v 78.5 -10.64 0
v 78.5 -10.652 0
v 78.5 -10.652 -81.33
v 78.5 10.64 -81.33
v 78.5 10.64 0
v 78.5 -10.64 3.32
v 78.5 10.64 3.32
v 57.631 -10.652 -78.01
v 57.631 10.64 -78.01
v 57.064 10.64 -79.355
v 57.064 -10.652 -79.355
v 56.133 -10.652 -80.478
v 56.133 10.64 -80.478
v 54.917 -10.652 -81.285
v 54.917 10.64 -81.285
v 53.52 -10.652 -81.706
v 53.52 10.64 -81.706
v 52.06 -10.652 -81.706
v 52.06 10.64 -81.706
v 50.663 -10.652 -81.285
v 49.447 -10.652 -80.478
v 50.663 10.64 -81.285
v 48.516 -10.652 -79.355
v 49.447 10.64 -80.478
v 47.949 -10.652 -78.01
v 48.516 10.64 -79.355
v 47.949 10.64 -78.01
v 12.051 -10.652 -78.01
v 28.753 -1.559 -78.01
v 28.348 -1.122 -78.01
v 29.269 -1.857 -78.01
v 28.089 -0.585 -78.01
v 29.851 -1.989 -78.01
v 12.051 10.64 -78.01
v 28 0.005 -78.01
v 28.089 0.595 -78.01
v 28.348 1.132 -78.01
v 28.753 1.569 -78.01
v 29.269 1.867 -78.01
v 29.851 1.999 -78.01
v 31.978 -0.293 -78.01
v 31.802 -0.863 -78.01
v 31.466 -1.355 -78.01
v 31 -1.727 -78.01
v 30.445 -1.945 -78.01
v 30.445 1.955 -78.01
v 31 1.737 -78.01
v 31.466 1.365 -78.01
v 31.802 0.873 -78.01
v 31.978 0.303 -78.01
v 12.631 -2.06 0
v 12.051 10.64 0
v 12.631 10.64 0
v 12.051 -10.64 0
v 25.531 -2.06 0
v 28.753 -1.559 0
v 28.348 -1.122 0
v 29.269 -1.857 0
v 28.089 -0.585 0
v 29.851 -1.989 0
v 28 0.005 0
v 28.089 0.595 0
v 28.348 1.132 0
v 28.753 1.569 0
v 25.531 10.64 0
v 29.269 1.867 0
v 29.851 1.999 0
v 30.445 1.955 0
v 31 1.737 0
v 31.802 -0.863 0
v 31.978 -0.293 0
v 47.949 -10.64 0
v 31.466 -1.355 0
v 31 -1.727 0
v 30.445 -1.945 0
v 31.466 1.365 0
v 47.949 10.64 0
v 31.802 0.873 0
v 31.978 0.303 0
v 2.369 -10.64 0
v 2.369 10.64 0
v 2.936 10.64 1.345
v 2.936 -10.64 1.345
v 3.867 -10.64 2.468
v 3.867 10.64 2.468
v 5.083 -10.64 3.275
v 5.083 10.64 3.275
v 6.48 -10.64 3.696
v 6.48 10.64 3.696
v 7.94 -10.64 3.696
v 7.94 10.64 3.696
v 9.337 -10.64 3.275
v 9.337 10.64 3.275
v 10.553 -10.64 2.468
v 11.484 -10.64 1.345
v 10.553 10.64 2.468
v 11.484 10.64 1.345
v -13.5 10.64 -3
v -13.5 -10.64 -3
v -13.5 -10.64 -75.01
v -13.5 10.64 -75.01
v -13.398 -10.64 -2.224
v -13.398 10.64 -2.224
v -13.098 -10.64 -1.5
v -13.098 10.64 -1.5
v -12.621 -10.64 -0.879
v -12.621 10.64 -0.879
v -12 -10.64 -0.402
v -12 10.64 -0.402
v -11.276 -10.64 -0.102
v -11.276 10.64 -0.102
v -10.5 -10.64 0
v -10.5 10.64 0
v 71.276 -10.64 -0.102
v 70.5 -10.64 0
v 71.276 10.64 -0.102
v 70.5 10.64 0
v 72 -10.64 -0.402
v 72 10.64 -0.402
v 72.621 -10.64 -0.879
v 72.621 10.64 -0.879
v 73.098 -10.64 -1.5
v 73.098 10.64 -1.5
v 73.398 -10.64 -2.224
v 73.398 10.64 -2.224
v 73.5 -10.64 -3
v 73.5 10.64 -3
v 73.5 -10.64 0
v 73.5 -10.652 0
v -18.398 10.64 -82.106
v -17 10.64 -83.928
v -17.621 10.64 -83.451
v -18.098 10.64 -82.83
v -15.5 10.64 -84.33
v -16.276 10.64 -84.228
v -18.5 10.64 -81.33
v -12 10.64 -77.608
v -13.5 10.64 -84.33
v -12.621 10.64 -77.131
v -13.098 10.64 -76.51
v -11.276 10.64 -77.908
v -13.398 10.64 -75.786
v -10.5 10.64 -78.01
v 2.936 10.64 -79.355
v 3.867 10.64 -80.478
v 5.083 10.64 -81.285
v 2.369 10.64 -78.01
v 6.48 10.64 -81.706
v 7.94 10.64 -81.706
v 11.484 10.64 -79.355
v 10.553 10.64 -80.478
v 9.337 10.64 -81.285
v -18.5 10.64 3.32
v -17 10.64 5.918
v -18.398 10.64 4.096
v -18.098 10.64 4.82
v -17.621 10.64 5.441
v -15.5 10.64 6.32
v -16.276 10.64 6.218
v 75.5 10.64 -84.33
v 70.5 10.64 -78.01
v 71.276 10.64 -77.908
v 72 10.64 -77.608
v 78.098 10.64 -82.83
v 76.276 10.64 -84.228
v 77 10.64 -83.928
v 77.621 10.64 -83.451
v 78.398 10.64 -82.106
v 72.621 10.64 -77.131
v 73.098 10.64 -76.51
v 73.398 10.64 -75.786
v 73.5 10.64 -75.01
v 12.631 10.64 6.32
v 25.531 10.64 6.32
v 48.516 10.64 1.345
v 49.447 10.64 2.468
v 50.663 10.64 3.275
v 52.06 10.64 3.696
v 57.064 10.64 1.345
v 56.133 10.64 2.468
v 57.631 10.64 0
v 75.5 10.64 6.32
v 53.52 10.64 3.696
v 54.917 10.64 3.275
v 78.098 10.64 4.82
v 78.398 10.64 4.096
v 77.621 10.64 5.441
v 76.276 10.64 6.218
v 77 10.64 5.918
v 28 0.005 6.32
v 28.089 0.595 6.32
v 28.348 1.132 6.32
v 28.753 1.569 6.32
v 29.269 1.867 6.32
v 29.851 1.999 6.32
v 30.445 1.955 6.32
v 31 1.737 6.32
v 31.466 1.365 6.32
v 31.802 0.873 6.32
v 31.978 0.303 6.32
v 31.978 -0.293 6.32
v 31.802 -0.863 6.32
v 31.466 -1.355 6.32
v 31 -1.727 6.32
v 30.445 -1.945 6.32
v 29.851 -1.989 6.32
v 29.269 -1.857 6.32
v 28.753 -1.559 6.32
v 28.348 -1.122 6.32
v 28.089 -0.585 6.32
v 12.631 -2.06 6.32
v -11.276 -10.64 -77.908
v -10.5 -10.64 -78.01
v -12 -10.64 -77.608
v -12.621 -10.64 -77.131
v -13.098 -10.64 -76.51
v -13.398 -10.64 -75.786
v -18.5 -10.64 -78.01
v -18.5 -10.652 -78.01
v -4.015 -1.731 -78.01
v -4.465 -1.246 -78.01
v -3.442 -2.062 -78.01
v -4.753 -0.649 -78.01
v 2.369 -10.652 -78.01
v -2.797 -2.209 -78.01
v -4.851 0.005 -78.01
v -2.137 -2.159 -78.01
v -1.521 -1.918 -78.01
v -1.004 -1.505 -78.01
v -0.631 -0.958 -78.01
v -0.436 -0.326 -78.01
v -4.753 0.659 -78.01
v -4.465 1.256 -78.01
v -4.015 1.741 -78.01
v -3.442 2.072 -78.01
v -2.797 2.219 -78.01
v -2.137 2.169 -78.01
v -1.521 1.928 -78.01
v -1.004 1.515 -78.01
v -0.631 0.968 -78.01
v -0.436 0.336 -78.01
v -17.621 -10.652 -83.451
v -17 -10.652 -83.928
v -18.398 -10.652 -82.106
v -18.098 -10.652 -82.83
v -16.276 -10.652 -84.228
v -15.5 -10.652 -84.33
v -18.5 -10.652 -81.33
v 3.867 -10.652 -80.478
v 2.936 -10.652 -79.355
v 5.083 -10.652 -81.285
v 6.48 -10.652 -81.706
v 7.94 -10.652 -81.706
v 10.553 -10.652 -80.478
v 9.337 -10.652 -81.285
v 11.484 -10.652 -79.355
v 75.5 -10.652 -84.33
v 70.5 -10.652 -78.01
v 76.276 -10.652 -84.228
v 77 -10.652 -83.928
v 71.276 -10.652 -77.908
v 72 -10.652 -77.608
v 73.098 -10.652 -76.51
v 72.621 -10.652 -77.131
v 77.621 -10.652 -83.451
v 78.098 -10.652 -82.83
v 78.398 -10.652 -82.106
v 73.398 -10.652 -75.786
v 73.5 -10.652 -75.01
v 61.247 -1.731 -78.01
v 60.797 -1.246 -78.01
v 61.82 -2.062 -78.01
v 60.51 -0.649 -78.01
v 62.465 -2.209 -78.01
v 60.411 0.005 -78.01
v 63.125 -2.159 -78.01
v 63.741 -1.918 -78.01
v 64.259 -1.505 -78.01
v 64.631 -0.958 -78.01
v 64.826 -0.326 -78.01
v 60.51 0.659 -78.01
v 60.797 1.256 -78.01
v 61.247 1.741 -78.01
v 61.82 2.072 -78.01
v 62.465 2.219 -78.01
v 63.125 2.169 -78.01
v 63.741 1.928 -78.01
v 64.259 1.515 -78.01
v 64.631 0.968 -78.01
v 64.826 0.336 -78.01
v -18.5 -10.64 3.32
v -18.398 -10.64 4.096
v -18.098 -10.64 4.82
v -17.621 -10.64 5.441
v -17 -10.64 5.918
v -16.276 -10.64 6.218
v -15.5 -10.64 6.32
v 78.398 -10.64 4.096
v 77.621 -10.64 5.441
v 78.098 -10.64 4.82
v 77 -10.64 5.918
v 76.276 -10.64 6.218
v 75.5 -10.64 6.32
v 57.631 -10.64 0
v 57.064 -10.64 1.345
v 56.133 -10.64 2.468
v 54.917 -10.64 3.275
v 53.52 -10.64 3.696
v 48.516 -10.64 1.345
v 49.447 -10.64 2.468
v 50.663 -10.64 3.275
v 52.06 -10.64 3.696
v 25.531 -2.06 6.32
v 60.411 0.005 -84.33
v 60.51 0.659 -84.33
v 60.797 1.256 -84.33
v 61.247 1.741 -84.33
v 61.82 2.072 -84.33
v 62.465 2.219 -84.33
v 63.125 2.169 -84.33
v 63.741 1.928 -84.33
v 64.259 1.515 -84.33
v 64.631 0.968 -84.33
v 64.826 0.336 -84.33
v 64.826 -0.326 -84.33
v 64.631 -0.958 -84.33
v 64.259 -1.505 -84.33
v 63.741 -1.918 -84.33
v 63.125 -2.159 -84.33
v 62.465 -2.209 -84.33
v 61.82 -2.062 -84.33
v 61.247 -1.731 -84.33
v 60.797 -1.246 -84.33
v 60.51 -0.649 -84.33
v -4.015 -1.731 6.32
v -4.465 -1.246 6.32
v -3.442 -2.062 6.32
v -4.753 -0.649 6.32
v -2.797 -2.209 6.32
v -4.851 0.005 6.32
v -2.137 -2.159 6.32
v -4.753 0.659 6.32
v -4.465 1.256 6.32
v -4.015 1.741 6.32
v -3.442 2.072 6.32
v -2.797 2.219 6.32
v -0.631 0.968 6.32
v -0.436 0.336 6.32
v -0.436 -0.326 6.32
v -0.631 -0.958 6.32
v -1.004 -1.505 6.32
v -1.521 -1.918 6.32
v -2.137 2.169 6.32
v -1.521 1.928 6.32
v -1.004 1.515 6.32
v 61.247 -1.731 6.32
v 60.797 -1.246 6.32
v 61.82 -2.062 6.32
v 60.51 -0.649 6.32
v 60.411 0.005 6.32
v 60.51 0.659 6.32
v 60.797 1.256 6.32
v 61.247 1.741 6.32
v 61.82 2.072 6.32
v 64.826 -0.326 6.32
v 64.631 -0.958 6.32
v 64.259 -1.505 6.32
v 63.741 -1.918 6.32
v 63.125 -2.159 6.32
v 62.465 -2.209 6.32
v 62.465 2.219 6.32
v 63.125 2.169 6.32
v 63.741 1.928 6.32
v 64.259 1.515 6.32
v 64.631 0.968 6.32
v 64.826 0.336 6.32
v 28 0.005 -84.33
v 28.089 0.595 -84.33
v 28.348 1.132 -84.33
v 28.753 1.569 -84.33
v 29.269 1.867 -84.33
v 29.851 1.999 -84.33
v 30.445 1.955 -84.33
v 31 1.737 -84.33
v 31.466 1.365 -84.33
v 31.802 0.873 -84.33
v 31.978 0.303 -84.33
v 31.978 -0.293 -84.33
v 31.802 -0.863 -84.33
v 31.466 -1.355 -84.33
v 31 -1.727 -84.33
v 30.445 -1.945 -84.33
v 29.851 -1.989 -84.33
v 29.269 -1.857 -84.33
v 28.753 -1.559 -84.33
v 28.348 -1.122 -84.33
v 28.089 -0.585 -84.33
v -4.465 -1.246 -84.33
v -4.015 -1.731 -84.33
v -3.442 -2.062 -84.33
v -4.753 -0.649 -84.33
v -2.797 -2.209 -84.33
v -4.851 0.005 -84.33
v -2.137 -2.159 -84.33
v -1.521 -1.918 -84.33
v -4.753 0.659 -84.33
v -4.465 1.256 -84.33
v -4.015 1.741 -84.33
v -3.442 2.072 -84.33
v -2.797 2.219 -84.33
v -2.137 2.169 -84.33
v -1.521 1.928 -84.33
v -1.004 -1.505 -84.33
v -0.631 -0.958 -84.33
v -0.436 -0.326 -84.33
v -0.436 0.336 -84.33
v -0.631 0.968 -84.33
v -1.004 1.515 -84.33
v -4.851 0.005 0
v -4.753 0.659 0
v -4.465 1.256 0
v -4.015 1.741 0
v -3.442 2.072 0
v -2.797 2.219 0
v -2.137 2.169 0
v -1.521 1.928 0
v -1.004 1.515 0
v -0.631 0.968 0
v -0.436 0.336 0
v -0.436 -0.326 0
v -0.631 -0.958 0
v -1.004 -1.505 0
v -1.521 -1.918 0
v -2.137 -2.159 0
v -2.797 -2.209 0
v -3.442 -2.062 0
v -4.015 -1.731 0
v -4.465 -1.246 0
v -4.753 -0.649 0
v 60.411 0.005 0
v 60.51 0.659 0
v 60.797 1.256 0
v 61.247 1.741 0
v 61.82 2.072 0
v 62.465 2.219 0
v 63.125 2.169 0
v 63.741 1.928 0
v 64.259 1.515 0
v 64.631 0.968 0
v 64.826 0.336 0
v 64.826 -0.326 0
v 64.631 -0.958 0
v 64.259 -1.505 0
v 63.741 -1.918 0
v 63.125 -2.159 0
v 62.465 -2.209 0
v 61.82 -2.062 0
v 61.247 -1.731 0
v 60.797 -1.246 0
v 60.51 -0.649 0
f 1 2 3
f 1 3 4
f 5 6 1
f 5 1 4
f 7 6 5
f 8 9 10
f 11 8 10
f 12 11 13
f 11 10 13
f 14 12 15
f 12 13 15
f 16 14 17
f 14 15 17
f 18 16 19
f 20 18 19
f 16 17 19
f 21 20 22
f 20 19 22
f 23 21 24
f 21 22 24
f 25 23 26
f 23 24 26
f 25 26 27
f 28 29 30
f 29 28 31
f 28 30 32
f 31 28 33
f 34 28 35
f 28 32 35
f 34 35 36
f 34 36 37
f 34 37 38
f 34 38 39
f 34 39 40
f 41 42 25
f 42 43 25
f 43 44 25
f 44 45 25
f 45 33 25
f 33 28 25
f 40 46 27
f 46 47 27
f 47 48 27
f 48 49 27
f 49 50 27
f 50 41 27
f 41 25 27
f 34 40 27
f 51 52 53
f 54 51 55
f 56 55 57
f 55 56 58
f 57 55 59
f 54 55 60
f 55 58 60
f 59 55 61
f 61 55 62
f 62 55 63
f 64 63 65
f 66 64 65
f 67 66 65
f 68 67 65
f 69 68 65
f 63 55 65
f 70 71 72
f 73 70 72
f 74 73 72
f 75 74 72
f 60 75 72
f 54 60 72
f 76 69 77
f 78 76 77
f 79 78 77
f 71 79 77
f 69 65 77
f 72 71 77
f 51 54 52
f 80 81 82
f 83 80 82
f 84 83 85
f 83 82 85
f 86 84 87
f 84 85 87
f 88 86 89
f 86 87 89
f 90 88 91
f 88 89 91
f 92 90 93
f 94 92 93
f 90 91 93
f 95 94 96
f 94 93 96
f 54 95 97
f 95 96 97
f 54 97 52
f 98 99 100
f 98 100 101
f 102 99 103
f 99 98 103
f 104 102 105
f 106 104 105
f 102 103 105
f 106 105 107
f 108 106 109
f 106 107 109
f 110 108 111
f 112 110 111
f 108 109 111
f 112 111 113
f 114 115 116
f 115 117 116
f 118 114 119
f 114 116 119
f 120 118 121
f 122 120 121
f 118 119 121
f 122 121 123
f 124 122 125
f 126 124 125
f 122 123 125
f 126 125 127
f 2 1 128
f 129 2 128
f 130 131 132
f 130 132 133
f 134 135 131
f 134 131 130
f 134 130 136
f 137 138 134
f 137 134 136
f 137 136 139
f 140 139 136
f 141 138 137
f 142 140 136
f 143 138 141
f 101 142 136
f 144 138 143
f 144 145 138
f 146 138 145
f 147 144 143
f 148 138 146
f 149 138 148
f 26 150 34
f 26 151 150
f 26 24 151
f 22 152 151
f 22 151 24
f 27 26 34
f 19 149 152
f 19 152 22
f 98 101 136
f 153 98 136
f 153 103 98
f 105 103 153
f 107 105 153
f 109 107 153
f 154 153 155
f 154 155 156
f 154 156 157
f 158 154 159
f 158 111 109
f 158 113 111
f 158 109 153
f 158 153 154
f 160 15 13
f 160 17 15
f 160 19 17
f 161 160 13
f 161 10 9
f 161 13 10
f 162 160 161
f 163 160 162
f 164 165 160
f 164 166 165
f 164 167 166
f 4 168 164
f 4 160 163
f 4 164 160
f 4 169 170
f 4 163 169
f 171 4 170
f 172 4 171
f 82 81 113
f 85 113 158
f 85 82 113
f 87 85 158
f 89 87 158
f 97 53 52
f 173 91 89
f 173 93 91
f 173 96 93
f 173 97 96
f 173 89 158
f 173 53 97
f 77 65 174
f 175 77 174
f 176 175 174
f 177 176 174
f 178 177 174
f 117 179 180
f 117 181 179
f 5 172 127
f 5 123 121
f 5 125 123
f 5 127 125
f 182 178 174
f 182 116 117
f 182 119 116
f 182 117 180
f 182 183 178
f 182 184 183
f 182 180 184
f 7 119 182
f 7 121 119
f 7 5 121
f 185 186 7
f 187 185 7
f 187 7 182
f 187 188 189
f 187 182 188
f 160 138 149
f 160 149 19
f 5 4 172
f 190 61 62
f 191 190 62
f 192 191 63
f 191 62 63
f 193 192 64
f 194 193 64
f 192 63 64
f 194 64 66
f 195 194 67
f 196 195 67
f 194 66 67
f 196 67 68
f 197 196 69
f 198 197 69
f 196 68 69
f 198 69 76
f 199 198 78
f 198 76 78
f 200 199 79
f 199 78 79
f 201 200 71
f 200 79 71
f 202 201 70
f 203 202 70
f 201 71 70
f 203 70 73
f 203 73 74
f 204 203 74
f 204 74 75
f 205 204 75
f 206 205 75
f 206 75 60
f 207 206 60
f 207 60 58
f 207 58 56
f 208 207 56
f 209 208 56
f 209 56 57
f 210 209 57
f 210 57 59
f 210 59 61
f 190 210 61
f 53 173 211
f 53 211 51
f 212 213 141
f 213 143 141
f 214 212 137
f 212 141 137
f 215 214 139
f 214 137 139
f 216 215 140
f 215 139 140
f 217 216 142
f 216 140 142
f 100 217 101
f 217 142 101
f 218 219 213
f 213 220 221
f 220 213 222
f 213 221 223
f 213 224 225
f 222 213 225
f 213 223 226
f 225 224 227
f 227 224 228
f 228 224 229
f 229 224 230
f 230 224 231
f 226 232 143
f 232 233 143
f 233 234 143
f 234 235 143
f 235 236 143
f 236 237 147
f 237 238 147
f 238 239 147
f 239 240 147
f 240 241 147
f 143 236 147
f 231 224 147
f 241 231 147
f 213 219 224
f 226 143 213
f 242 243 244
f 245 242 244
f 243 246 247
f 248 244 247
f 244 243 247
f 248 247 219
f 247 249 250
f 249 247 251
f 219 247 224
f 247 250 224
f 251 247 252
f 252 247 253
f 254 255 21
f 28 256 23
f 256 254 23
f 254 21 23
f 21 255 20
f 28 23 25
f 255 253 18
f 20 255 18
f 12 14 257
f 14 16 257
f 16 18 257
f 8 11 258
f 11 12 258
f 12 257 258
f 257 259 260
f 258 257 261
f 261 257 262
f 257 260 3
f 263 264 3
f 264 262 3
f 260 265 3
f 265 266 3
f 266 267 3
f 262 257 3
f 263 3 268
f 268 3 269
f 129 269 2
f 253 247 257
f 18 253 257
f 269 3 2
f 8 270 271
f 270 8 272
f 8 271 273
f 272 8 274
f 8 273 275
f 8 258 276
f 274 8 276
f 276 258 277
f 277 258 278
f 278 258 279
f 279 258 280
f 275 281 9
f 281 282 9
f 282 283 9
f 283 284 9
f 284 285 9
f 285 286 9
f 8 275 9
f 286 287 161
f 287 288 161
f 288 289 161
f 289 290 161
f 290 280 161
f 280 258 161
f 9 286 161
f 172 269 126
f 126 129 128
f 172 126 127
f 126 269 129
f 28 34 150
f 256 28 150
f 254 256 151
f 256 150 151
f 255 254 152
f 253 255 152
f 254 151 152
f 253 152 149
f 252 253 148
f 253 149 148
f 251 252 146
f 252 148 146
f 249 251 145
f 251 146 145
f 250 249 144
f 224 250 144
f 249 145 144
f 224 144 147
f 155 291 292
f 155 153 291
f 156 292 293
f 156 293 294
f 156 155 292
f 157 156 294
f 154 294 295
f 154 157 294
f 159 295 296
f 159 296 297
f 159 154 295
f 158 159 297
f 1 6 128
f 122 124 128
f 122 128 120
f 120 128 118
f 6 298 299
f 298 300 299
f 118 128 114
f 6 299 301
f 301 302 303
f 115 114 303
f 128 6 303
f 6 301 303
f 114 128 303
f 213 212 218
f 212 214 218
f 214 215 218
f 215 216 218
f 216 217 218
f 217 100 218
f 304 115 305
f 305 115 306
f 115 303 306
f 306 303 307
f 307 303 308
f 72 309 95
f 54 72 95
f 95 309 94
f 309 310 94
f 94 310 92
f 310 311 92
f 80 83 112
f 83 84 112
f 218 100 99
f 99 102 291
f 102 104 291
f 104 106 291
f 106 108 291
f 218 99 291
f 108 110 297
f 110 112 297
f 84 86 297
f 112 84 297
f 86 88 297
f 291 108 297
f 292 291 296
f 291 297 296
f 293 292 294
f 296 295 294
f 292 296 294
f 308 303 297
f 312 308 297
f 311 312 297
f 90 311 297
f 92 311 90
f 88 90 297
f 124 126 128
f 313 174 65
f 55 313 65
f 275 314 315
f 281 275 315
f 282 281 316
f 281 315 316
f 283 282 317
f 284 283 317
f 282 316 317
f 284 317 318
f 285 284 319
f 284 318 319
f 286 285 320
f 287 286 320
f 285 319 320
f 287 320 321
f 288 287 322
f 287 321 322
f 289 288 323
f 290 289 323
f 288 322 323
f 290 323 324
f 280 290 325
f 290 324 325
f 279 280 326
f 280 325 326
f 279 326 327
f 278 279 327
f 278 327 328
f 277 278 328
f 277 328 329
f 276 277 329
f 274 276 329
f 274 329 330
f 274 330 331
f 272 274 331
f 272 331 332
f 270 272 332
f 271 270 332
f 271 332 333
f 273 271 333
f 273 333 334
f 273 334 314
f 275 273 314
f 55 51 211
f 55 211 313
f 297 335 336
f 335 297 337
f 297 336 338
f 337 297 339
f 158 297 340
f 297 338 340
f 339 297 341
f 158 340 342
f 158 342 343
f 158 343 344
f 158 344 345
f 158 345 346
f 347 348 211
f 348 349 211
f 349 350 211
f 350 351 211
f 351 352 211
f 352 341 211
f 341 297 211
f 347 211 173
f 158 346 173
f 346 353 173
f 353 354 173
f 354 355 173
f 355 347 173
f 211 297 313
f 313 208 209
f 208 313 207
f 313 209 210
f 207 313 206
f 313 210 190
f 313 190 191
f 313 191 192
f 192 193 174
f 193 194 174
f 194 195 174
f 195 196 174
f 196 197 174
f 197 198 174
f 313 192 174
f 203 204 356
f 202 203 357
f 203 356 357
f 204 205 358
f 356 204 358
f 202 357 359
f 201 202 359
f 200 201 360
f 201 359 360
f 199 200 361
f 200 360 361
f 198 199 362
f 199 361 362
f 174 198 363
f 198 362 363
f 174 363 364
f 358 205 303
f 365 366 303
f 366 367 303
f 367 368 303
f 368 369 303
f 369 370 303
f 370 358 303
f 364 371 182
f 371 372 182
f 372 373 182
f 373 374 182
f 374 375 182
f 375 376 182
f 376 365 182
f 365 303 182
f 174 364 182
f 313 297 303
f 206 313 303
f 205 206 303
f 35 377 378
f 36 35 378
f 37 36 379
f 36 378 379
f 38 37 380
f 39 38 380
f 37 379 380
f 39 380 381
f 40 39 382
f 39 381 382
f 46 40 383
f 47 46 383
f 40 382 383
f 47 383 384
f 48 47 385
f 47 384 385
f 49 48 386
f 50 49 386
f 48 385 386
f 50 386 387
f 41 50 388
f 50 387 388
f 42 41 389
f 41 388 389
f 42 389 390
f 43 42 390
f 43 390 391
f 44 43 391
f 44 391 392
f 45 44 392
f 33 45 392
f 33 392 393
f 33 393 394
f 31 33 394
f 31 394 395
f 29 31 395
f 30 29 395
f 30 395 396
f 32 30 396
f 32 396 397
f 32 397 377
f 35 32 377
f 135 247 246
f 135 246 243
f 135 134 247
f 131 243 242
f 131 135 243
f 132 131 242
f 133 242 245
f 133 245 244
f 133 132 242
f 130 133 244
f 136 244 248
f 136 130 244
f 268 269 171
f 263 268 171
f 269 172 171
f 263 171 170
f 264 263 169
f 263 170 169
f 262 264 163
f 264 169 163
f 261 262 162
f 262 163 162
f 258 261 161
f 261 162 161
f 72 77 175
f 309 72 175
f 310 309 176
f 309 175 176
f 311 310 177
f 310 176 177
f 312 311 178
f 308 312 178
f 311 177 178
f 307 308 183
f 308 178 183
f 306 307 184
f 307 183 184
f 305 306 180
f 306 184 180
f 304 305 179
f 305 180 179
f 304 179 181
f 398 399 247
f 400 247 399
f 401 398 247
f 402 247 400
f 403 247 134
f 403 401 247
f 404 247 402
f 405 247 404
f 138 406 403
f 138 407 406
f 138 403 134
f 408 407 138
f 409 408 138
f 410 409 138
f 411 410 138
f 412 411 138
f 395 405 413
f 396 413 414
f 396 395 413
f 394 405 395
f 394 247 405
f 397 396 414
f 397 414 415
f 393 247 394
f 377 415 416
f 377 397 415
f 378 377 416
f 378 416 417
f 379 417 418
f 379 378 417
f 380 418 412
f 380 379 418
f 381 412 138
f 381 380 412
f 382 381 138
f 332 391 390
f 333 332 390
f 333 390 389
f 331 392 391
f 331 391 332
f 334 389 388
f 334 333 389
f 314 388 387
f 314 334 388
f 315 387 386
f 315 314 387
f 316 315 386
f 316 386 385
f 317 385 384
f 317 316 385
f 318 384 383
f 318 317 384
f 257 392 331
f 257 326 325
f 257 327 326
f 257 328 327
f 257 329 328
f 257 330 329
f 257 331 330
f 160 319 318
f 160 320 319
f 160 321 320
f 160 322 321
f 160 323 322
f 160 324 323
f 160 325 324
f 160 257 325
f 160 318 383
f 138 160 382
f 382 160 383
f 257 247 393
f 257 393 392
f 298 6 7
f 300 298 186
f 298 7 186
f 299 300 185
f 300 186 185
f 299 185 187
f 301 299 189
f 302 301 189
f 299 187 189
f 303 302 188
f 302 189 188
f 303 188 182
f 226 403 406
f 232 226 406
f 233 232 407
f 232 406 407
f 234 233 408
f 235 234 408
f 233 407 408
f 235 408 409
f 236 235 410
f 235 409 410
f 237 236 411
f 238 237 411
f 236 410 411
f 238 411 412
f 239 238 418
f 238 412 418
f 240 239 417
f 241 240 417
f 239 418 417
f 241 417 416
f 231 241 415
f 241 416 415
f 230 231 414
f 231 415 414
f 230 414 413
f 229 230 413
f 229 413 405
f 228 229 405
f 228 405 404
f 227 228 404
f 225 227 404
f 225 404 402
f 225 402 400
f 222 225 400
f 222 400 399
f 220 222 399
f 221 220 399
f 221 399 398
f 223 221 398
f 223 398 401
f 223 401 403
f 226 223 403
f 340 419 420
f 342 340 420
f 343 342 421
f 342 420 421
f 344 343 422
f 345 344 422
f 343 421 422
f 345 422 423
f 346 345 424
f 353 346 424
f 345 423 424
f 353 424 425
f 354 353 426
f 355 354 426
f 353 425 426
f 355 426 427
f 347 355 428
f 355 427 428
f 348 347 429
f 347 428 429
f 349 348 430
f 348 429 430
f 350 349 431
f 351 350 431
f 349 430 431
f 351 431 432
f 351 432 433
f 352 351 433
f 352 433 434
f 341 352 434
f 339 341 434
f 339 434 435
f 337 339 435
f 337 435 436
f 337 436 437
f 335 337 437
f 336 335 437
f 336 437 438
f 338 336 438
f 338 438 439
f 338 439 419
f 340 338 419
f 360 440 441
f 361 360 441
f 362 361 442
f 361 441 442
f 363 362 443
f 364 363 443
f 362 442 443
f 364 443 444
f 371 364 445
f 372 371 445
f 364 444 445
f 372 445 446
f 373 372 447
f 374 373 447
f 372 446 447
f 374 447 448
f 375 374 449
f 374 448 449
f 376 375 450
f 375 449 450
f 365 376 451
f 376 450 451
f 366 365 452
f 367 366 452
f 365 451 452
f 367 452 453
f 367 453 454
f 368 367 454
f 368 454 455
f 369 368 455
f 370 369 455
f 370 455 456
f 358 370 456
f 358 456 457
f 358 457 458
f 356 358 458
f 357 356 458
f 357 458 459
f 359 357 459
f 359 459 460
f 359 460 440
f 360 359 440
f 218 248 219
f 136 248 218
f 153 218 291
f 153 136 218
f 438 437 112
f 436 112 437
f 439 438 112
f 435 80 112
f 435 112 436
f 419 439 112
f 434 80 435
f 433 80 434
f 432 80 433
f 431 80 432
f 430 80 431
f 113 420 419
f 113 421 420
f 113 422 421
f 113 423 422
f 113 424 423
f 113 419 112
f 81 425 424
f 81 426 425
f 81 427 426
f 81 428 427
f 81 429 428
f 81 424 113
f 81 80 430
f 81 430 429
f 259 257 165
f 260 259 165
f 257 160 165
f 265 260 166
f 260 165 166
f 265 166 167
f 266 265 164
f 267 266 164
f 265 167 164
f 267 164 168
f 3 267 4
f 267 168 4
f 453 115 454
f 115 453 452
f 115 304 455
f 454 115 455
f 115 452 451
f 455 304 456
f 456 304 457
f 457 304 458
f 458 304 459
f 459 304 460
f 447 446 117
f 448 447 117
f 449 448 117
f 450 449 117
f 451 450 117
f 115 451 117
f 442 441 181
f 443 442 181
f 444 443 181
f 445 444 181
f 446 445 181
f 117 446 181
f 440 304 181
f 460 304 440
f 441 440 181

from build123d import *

# Parameters (mm, degrees)
SKETCH1_W           = 60
SKETCH1_H           = 6.32
BOSS_EXTRUDE1_DEPTH = 10.64
SKETCH2_R           = 5
CUT_EXTRUDE1_DEPTH  = 64.974845056
SKETCH3_W           = 6.32
SKETCH3_H           = 21.28
BOSS_EXTRUDE2_DEPTH = 18.5
SKETCH4_W           = 6.32
SKETCH4_H           = 21.28
BOSS_EXTRUDE3_DEPTH = 18.5
SKETCH5_W           = 5
SKETCH5_H           = 21.28
BOSS_EXTRUDE6_DEPTH = 84.33
SKETCH6_W           = 5
SKETCH6_H           = 21.291954735
BOSS_EXTRUDE7_DEPTH = 84.33
SKETCH7_W           = 6.32
SKETCH7_H           = 21.291954735
BOSS_EXTRUDE8_DEPTH = 92
SKETCH9_R           = 5
CUT_EXTRUDE2_DEPTH  = 118.162904694
SKETCH10_R          = 2.22
CUT_EXTRUDE3_DEPTH  = 121.387443862
FILLET1_R           = 3
SKETCH13_R          = 2
CUT_EXTRUDE4_DEPTH  = 121.387443862
SKETCH14_W          = 12.9
SKETCH14_H          = 6.32
CUT_EXTRUDE5_DEPTH  = 12.7


with BuildPart() as part:
    # Sketch1 → Boss-Extrude1 (new, symmetric)
    with BuildSketch(Plane(origin=(0, 0, 0), x_dir=(1, 0, 0), z_dir=(0, 1, 0))):
        with Locations((30, -3.16)):
            Rectangle(SKETCH1_W, SKETCH1_H)
    extrude(amount=BOSS_EXTRUDE1_DEPTH, both=True)

    # Sketch2 → Cut-Extrude1 (cut, through all)
    with BuildSketch(Plane(origin=(0, 10.64, 0), x_dir=(1, 0, 0), z_dir=(0, 1, 0))):
        with Locations((7.21, 1.25)):
            Circle(SKETCH2_R)
        with Locations((52.79, 1.25)):
            Circle(SKETCH2_R)
    extrude(amount=-CUT_EXTRUDE1_DEPTH, mode=Mode.SUBTRACT)

    # Sketch3 → Boss-Extrude2 (add)
    with BuildSketch(Plane(origin=(60, 0, 0), x_dir=(0, 0, -1), z_dir=(1, 0, 0))):
        with Locations((-3.16, 0)):
            Rectangle(SKETCH3_W, SKETCH3_H)
    extrude(amount=BOSS_EXTRUDE2_DEPTH)

    # Sketch4 → Boss-Extrude3 (add)
    with BuildSketch(Plane.ZY):
        with Locations((3.16, 0)):
            Rectangle(SKETCH4_W, SKETCH4_H)
    extrude(amount=BOSS_EXTRUDE3_DEPTH)

    # Sketch5 → Boss-Extrude6 (add)
    with BuildSketch(Plane(origin=(0, 0, 0), x_dir=(-1, 0, 0), z_dir=(0, 0, -1))):
        with Locations((16, 0)):
            Rectangle(SKETCH5_W, SKETCH5_H)
    extrude(amount=BOSS_EXTRUDE6_DEPTH)

    # Sketch6 → Boss-Extrude7 (add)
    with BuildSketch(Plane(origin=(0, 0, 0), x_dir=(-1, 0, 0), z_dir=(0, 0, -1))):
        with Locations((-76, -0.005977367)):
            Rectangle(SKETCH6_W, SKETCH6_H)
    extrude(amount=BOSS_EXTRUDE7_DEPTH)

    # Sketch7 → Boss-Extrude8 (add, through all)
    with BuildSketch(Plane.ZY.offset(-73.5)):
        with Locations((-81.17, -0.005977367)):
            Rectangle(SKETCH7_W, SKETCH7_H)
    extrude(amount=BOSS_EXTRUDE8_DEPTH)

    # Sketch9 → Cut-Extrude2 (cut, through all)
    with BuildSketch(Plane(origin=(0, 10.64, 0), x_dir=(1, 0, 0), z_dir=(0, 1, 0))):
        with Locations((7.21, 76.76)):
            Circle(SKETCH9_R)
        with Locations((52.79, 76.76)):
            Circle(SKETCH9_R)
    extrude(amount=-CUT_EXTRUDE2_DEPTH, mode=Mode.SUBTRACT)

    # Sketch10 → Cut-Extrude3 (cut, through all)
    with BuildSketch(Plane(origin=(0, 0, -84.33), x_dir=(-1, 0, 0), z_dir=(0, 0, -1))):
        with Locations((-62.631229183, 0.005)):
            Circle(SKETCH10_R)
        with Locations((2.631229183, 0.005)):
            Circle(SKETCH10_R)
    extrude(amount=-CUT_EXTRUDE3_DEPTH, mode=Mode.SUBTRACT)

    # Fillet1
    fillet1_edges = [part.edges().sort_by_distance(p)[0] for p in [
        (78.5, 0, 6.32),
        (-18.5, 0, 6.32),
        (-13.5, 0, 0),
        (-18.5, -0.005977367, -84.33),
        (73.5, 0, 0),
        (78.5, -0.005977367, -84.33),
        (-13.5, 0, -78.01),
        (73.5, -0.005977367, -78.01),
    ]]
    fillet(fillet1_edges, radius=FILLET1_R)

    # Sketch13 → Cut-Extrude4 (cut, through all)
    with BuildSketch(Plane(origin=(0, 0, -84.33), x_dir=(-1, 0, 0), z_dir=(0, 0, -1))):
        with Locations((-30, 0.005)):
            Circle(SKETCH13_R)
    extrude(amount=-CUT_EXTRUDE4_DEPTH, mode=Mode.SUBTRACT)

    # Sketch14 → Cut-Extrude5 (cut, symmetric)
    with BuildSketch(Plane(origin=(0, 10.64, 0), x_dir=(1, 0, 0), z_dir=(0, 1, 0))):
        with Locations((19.080701294, -3.16)):
            Rectangle(SKETCH14_W, SKETCH14_H)
    extrude(amount=CUT_EXTRUDE5_DEPTH, both=True, mode=Mode.SUBTRACT)


solid = part.part
